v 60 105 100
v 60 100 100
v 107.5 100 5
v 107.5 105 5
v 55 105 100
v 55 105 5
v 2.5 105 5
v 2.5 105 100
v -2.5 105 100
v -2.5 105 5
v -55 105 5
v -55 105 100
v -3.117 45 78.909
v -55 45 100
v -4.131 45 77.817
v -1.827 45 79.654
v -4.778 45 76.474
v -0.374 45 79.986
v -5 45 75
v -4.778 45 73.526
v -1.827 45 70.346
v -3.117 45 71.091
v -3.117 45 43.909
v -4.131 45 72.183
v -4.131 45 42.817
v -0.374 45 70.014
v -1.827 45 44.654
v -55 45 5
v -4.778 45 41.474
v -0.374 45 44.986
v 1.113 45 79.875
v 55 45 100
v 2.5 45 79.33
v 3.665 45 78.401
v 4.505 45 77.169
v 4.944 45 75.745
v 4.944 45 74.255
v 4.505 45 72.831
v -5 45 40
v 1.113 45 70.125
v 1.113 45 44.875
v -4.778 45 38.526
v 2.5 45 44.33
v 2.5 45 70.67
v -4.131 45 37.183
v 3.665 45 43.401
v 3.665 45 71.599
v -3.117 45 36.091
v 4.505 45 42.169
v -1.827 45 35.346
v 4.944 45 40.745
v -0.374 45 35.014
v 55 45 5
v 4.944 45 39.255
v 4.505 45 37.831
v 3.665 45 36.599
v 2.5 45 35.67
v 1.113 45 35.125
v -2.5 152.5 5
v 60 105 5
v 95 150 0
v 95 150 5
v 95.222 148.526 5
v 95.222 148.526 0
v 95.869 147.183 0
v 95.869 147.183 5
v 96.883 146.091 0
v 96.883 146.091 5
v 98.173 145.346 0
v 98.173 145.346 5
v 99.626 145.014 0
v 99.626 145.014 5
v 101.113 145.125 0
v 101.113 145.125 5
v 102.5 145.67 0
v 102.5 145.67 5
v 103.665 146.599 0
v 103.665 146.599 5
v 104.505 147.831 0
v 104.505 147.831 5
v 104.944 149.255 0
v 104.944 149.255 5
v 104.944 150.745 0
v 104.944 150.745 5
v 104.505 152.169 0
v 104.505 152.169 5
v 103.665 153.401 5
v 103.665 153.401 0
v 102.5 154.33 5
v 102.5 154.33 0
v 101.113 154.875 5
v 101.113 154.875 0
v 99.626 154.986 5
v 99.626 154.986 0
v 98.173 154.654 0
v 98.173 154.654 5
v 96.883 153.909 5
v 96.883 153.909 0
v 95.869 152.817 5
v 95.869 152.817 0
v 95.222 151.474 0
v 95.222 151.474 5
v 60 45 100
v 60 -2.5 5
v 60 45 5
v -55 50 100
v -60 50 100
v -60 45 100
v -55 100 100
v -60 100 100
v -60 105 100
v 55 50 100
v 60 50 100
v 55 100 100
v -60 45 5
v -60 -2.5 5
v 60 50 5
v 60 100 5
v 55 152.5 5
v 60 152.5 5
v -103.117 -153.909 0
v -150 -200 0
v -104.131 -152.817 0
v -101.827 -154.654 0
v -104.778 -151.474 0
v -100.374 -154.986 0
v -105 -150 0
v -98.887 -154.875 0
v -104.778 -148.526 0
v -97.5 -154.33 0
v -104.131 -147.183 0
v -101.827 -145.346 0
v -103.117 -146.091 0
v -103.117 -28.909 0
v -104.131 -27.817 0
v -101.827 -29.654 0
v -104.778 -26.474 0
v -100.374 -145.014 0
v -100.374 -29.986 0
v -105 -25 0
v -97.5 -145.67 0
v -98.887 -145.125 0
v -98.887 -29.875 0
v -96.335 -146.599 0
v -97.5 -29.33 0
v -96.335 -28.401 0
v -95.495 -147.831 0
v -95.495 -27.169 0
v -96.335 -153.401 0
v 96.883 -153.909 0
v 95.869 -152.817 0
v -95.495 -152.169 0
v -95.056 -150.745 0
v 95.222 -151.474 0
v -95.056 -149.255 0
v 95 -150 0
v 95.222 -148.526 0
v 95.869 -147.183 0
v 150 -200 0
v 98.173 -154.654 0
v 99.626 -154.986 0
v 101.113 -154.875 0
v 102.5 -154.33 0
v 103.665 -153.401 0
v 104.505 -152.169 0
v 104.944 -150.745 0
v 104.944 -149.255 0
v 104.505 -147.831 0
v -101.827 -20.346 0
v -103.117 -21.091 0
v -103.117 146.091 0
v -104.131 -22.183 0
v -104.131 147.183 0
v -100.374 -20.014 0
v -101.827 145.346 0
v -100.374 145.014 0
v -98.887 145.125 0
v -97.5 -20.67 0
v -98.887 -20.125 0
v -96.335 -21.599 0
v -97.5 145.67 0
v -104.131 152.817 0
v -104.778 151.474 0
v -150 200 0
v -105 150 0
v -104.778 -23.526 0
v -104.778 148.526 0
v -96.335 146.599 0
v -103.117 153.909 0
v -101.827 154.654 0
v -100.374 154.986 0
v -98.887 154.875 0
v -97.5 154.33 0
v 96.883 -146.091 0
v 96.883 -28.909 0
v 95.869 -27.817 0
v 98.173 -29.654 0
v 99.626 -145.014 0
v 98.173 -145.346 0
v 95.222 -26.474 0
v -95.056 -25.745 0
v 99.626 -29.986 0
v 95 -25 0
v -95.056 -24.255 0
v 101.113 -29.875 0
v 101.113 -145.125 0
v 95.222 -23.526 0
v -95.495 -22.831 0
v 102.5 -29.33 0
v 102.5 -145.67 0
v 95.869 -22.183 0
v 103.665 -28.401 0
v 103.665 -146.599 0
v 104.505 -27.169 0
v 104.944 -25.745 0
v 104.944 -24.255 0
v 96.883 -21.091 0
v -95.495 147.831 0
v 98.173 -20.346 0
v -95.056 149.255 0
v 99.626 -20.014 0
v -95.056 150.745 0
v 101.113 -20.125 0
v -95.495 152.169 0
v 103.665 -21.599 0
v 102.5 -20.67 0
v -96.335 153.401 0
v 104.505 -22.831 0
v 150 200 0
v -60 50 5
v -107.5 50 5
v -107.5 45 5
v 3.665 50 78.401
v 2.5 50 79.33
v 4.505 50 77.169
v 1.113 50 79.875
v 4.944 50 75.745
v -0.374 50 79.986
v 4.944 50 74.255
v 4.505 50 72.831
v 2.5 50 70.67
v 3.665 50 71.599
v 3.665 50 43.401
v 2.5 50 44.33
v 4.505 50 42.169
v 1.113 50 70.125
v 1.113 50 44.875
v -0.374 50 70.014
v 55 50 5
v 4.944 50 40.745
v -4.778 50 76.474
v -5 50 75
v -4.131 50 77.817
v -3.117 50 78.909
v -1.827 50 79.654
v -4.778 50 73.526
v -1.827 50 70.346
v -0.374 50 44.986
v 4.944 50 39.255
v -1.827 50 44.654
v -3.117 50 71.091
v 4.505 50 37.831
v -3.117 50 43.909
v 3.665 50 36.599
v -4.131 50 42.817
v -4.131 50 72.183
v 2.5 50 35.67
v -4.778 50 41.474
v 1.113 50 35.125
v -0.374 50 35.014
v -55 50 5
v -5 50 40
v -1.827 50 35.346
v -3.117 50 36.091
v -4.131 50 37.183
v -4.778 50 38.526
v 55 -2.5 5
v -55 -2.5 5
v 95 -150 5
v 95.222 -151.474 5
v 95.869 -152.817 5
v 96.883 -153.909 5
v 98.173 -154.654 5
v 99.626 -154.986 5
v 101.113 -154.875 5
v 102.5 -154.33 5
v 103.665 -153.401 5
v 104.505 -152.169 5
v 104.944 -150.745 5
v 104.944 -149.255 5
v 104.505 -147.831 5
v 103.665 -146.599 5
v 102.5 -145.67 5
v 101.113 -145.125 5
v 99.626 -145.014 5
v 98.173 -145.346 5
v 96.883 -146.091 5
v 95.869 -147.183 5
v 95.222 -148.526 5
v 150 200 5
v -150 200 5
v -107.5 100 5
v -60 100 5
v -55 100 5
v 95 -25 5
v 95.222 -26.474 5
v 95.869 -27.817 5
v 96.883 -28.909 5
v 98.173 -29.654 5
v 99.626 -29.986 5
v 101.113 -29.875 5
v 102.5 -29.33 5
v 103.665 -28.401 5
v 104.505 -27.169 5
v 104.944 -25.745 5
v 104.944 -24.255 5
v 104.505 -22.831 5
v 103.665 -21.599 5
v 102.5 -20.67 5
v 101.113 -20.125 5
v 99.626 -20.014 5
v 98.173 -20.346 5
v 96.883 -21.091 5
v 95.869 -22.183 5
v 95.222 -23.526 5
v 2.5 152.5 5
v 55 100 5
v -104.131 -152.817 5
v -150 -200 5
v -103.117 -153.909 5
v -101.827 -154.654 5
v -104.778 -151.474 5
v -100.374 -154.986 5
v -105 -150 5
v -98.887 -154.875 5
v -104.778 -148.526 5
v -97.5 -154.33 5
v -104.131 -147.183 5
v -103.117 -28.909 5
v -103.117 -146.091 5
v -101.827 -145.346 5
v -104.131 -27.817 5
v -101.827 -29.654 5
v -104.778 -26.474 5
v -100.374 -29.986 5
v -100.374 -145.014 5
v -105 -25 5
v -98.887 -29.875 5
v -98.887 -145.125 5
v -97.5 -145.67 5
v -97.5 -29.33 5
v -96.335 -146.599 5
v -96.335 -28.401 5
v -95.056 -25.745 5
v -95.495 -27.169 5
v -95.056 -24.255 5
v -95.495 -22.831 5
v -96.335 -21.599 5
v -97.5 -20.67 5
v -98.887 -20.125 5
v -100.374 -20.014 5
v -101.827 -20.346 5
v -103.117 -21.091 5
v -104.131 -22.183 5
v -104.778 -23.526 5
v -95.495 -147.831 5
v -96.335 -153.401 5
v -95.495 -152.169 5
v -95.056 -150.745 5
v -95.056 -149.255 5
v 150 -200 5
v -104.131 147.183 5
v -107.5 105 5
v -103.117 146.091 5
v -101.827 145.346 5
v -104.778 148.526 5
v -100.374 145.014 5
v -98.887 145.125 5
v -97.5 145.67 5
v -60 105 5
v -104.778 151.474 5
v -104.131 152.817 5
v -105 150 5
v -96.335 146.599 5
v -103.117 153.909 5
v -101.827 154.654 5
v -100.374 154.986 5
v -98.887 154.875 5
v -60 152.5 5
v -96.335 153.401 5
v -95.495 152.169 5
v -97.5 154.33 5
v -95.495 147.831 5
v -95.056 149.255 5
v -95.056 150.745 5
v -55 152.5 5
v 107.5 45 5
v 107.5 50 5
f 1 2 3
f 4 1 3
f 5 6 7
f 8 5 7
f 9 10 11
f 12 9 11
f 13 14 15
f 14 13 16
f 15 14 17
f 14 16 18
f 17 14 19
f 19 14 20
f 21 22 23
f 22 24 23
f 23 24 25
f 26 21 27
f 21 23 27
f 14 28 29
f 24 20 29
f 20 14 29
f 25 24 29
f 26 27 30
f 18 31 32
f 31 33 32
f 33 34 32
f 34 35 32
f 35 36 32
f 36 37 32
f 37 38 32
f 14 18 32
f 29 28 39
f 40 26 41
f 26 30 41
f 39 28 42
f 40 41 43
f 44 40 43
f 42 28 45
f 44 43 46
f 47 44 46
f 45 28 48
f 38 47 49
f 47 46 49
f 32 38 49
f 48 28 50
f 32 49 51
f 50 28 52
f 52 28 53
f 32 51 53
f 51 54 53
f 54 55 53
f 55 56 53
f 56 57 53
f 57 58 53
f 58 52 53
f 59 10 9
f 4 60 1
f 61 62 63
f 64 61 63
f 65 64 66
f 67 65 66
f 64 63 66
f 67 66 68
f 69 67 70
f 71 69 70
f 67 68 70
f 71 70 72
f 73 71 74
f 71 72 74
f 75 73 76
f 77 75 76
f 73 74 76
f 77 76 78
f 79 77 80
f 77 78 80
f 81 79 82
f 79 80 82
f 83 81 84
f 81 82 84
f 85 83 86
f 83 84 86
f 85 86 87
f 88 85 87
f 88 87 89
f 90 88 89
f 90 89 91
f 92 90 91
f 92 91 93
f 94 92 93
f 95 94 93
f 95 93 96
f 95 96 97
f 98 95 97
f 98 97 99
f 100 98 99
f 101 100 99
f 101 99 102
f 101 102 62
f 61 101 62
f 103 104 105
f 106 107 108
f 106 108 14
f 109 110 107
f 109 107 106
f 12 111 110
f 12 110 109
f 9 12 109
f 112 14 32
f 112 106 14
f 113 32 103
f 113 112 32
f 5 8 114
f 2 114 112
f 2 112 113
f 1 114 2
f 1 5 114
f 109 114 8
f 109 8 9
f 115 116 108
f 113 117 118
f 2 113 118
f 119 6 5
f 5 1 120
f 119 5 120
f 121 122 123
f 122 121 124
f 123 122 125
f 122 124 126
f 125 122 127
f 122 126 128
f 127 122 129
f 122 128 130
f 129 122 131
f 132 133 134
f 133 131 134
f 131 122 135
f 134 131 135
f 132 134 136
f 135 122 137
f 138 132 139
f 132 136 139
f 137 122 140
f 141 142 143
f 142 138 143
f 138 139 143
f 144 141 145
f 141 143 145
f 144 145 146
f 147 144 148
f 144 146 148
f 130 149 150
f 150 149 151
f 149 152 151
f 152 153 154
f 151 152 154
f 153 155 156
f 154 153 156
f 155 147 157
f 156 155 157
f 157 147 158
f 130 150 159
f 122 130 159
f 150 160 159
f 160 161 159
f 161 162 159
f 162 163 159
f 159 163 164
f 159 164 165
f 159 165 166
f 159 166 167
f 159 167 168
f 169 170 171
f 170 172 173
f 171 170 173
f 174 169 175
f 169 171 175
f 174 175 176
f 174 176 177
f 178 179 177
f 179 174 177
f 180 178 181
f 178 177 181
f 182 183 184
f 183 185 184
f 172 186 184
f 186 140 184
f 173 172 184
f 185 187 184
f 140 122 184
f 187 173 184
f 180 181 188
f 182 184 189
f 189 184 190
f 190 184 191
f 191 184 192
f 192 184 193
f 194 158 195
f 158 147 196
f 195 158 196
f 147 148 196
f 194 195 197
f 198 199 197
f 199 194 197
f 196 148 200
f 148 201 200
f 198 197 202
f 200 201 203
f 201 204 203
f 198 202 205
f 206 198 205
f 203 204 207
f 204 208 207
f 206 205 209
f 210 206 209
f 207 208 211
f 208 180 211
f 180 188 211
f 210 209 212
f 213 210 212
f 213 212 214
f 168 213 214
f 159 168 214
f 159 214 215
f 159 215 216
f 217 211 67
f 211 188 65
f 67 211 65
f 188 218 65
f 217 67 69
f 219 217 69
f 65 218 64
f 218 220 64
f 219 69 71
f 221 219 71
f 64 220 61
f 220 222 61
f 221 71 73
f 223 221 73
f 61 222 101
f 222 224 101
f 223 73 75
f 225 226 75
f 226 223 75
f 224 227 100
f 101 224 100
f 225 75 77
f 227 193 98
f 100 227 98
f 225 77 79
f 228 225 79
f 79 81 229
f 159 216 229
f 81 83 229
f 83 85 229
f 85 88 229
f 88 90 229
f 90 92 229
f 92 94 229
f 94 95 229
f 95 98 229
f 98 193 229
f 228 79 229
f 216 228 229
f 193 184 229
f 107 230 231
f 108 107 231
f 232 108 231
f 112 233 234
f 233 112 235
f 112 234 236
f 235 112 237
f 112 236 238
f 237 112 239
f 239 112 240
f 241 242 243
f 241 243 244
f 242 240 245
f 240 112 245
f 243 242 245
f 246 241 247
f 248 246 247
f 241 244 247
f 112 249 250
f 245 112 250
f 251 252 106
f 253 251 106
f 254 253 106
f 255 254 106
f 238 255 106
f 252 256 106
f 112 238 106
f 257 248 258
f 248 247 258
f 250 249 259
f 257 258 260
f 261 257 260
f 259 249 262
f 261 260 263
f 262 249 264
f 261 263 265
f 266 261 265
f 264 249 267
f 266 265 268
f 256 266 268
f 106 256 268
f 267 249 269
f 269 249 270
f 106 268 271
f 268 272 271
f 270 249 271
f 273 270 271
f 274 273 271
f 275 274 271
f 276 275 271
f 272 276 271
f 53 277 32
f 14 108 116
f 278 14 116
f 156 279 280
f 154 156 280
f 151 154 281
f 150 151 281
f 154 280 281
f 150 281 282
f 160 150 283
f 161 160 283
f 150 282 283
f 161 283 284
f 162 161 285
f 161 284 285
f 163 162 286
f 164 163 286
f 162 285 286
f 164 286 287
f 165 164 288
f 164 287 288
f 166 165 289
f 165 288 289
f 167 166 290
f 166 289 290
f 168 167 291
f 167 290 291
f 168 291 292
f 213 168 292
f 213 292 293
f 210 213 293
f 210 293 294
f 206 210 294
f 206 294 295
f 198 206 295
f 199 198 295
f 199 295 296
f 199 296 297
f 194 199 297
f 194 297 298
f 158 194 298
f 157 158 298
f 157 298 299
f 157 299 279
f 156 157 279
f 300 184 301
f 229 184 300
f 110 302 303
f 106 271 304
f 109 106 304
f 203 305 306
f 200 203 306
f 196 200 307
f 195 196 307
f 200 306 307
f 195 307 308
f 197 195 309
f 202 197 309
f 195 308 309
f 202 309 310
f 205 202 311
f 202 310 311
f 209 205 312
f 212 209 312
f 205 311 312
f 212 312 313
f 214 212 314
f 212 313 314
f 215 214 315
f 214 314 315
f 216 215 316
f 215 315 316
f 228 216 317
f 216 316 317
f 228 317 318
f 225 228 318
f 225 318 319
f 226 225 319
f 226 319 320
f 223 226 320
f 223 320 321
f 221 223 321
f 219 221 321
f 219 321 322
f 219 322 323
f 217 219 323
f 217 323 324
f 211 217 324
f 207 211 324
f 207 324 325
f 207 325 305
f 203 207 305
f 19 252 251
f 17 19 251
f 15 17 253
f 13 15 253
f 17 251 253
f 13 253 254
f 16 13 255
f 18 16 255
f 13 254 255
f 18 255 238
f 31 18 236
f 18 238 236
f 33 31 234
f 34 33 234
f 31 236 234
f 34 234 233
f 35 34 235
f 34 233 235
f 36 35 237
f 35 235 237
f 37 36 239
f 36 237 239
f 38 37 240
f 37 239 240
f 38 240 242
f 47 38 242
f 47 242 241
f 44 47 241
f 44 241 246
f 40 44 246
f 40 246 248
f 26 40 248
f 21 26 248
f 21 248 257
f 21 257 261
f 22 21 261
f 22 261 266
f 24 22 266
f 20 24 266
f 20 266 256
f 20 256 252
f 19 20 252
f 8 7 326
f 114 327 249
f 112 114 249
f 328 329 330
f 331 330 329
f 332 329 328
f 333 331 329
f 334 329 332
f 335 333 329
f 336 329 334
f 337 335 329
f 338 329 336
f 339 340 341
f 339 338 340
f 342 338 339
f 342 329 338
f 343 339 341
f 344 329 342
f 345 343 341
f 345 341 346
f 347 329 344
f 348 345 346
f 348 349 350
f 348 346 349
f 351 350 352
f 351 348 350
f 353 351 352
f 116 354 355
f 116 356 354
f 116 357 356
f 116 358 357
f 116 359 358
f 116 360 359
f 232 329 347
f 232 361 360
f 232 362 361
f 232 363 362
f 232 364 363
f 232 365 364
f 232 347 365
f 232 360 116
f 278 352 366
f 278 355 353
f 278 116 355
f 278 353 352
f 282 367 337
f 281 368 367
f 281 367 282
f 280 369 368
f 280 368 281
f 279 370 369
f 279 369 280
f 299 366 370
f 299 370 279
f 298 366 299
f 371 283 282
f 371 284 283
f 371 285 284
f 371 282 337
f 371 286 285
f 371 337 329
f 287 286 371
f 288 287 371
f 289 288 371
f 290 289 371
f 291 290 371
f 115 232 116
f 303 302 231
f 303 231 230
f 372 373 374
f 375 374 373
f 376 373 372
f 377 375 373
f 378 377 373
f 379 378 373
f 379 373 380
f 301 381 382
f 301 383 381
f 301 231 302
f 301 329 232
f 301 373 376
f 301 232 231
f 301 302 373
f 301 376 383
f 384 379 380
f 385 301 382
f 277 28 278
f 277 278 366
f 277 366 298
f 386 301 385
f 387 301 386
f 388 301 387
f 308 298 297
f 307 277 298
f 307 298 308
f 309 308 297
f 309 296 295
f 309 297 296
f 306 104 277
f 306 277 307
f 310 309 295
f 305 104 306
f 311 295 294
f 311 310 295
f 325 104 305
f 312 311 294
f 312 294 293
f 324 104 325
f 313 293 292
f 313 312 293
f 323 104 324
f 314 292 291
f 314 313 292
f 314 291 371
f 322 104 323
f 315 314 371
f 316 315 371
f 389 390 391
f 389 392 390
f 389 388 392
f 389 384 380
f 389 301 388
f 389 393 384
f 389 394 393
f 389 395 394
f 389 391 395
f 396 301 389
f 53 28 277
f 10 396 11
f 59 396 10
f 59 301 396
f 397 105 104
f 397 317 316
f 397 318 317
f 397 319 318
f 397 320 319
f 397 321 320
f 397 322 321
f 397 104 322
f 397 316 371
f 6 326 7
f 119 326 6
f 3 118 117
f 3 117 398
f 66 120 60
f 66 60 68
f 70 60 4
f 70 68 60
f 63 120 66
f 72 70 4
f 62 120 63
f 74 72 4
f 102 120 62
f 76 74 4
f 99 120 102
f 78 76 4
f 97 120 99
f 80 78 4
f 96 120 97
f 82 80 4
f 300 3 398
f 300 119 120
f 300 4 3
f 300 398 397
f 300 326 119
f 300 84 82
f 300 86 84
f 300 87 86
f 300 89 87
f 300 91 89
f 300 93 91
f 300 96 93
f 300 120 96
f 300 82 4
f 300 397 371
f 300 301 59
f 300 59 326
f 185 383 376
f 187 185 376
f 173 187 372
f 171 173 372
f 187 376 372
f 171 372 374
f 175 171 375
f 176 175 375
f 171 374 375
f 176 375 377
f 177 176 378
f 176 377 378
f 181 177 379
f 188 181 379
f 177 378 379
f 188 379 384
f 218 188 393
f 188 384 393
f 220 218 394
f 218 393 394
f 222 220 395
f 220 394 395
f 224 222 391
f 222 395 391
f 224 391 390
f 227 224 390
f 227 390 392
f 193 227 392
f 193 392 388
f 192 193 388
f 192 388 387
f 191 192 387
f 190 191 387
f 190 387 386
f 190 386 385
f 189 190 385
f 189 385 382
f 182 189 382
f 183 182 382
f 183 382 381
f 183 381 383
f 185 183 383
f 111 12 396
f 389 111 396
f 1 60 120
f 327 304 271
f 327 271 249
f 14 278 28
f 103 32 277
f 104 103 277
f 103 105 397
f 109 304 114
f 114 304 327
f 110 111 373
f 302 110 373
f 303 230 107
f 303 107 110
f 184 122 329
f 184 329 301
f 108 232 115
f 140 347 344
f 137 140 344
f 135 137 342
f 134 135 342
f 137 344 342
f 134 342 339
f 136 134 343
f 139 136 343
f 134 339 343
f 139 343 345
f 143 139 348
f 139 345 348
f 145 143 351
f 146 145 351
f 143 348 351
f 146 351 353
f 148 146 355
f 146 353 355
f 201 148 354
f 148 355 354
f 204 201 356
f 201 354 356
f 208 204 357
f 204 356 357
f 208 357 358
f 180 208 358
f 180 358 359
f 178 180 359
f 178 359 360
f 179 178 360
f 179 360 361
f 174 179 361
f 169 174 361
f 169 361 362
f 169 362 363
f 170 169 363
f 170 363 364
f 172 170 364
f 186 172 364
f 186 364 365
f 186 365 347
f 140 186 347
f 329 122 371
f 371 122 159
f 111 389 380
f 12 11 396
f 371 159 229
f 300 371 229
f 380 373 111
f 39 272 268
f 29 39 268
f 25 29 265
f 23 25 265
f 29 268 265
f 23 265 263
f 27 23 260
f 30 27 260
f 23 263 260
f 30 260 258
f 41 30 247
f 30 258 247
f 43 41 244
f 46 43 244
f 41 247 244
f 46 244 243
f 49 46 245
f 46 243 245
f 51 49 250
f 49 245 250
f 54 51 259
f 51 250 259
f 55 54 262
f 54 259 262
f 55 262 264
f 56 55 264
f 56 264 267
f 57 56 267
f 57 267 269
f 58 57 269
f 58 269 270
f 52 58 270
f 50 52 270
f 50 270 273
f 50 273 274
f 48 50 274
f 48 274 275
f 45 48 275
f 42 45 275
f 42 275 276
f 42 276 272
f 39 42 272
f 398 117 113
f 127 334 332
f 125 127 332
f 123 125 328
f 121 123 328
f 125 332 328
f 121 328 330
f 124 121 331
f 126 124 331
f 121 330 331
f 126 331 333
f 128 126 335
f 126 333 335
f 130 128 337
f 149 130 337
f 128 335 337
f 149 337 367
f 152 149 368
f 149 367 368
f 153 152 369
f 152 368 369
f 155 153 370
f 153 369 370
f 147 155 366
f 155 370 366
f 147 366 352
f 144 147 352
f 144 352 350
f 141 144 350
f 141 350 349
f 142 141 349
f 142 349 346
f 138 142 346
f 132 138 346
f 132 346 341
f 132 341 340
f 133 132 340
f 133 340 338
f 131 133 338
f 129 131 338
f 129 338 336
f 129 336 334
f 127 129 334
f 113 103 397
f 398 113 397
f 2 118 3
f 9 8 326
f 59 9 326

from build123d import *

# Parameters (mm, degrees)
F0_W         = 5
F0_H         = 50
F0_H_2       = 5
F0_W_2       = 50
F0_W_3       = 110
F1_DEPTH     = 100
F0_W_4       = 300
F0_H_3       = 400
F2_DEPTH     = 5
F3_T4_DEPTH  = 522.9657747574
F3_T9_DEPTH  = 522.9657747574
F3_T14_DEPTH = 522.9657747574
F3_T19_DEPTH = 522.9657747574
F3_T24_DEPTH = 522.9657747574
F3_T29_DEPTH = 522.9657747574
F3_T34_DEPTH = 522.9657747574
F3_T39_DEPTH = 522.9657747574
F3_T44_DEPTH = 522.9657747574
F6_D         = 10
F6_DEPTH     = 20
F6_TIP       = 3.0043030951
F7_D         = 10
F7_DEPTH     = 20
F7_TIP       = 3.0043030951


# Not quite as in the source:
# - a fillet or chamfer that OpenCascade refuses, or shapes differently, is made with other operations: its cross-section is extruded or revolved along the edge and cut away or added


with BuildPart() as f1:
    # F0 (on Top) → F1 (new body)
    with BuildSketch(Plane.XY):
        with Locations((-57.5, 130)):
            Rectangle(F0_W, F0_H)
        with Locations((-57.5, 20)):
            Rectangle(F0_W, F0_H)
        with Locations((-57.5, 102.5)):
            Rectangle(F0_W, F0_H_2)
        with Locations((57.5, 102.5)):
            Rectangle(F0_W, F0_H_2)
        with Locations((-85, 47.5)):
            Rectangle(F0_W_2, F0_H_2)
        with Locations((-85, 102.5)):
            Rectangle(F0_W_2, F0_H_2)
        Polygon((-55, 105), (-55, 100), (55, 100), (55, 105), (2.5, 105), (-2.5, 105), align=None)
        with Locations((57.5, 47.5)):
            Rectangle(F0_W, F0_H_2)
        with Locations((57.5, 75)):
            Rectangle(F0_W, F0_H)
        with Locations((0, 47.5)):
            Rectangle(F0_W_3, F0_H_2)
        with Locations((57.5, 130)):
            Rectangle(F0_W, F0_H)
        with Locations((85, 102.5)):
            Rectangle(F0_W_2, F0_H_2)
        with Locations((-57.5, 47.5)):
            Rectangle(F0_W, F0_H_2)
        with Locations((85, 47.5)):
            Rectangle(F0_W_2, F0_H_2)
        with Locations((-57.5, 75)):
            Rectangle(F0_W, F0_H)
        with Locations((57.5, 20)):
            Rectangle(F0_W, F0_H)
        with Locations((0, 130)):
            Rectangle(F0_W, F0_H)
    extrude(amount=F1_DEPTH)

    # F0 (on Top) → F2 (join)
    with BuildSketch(Plane.XY):
        Rectangle(F0_W_4, F0_H_3)
        Polygon((55, 45), (-55, 45), (-55, -5), (-60, -5), (-60, 45), (-110, 45), (-110, 50), (-60, 50), (-60, 100), (-110, 100), (-110, 105), (-60, 105), (-60, 155), (-55, 155), (-55, 105), (-2.5, 105), (-2.5, 155), (2.5, 155), (2.5, 105), (55, 105), (55, 155), (60, 155), (60, 105), (110, 105), (110, 100), (60, 100), (60, 50), (110, 50), (110, 45), (60, 45), (60, -5), (55, -5), align=None, mode=Mode.SUBTRACT)
        with Locations((0, 75)):
            Rectangle(F0_W_3, F0_H)
    extrude(amount=F2_DEPTH)

    # F3: chamfer of 50 x 100 on 9 edges, made by hand


with BuildPart() as f3_tool2:
    # F3_s3 → F3_t4 (new body)
    with BuildSketch(Plane.XZ.offset(213.9828873787)):
        Polygon((60, 100), (110, 0), (110, 100), align=None)
    extrude(amount=-F3_T4_DEPTH)

    split(bisect_by=Plane.XY.offset(5), keep=Keep.TOP)


with BuildPart() as f1_1:
    add(f1.part)

    # F3_t1: cut F3_tool2
    add(f3_tool2.part, mode=Mode.SUBTRACT)


with BuildPart() as f3_tool7:
    # F3_s8 → F3_t9 (new body)
    with BuildSketch(Plane.XZ.offset(158.9828873787)):
        Polygon((60, 100), (110, 0), (110, 100), align=None)
    extrude(amount=-F3_T9_DEPTH)

    split(bisect_by=Plane.XY.offset(5), keep=Keep.TOP)


with BuildPart() as f1_2:
    add(f1_1.part)

    # F3_t6: cut F3_tool7
    add(f3_tool7.part, mode=Mode.SUBTRACT)


with BuildPart() as f3_tool12:
    # F3_s13 → F3_t14 (new body)
    with BuildSketch(Plane.YZ.offset(-203.9828873787)):
        Polygon((45, 100), (-5, 0), (-5, 100), align=None)
    extrude(amount=F3_T14_DEPTH)

    split(bisect_by=Plane.XY.offset(5), keep=Keep.TOP)


with BuildPart() as f1_3:
    add(f1_2.part)

    # F3_t11: cut F3_tool12
    add(f3_tool12.part, mode=Mode.SUBTRACT)


with BuildPart() as f3_tool17:
    # F3_s18 → F3_t19 (new body)
    with BuildSketch(Plane.YZ.offset(318.9828873787)):
        Polygon((105, 100), (155, 0), (155, 100), align=None)
    extrude(amount=-F3_T19_DEPTH)

    split(bisect_by=Plane.XY.offset(5), keep=Keep.TOP)


with BuildPart() as f1_4:
    add(f1_3.part)

    # F3_t16: cut F3_tool17
    add(f3_tool17.part, mode=Mode.SUBTRACT)


with BuildPart() as f3_tool22:
    # F3_s23 → F3_t24 (new body)
    with BuildSketch(Plane.YZ.offset(-318.9828873787)):
        Polygon((45, 100), (-5, 0), (-5, 100), align=None)
    extrude(amount=F3_T24_DEPTH)

    split(bisect_by=Plane.XY.offset(5), keep=Keep.TOP)


with BuildPart() as f1_5:
    add(f1_4.part)

    # F3_t21: cut F3_tool22
    add(f3_tool22.part, mode=Mode.SUBTRACT)


with BuildPart() as f3_tool27:
    # F3_s28 → F3_t29 (new body)
    with BuildSketch(Plane.XZ.offset(-308.9828873787)):
        Polygon((-60, 100), (-110, 0), (-110, 100), align=None)
    extrude(amount=F3_T29_DEPTH)

    split(bisect_by=Plane.XY.offset(5), keep=Keep.TOP)


with BuildPart() as f1_6:
    add(f1_5.part)

    # F3_t26: cut F3_tool27
    add(f3_tool27.part, mode=Mode.SUBTRACT)


with BuildPart() as f3_tool32:
    # F3_s33 → F3_t34 (new body)
    with BuildSketch(Plane.XZ.offset(-363.9828873787)):
        Polygon((-60, 100), (-110, 0), (-110, 100), align=None)
    extrude(amount=F3_T34_DEPTH)

    split(bisect_by=Plane.XY.offset(5), keep=Keep.TOP)


with BuildPart() as f1_7:
    add(f1_6.part)

    # F3_t31: cut F3_tool32
    add(f3_tool32.part, mode=Mode.SUBTRACT)


with BuildPart() as f3_tool37:
    # F3_s38 → F3_t39 (new body)
    with BuildSketch(Plane.YZ.offset(203.9828873787)):
        Polygon((155, 0), (105, 100), (155, 100), align=None)
    extrude(amount=-F3_T39_DEPTH)

    split(bisect_by=Plane.XY.offset(5), keep=Keep.TOP)


with BuildPart() as f1_8:
    add(f1_7.part)

    # F3_t36: cut F3_tool37
    add(f3_tool37.part, mode=Mode.SUBTRACT)


with BuildPart() as f3_tool42:
    # F3_s43 → F3_t44 (new body)
    with BuildSketch(Plane.YZ.offset(261.4828873787)):
        Polygon((105, 100), (155, 0), (155, 100), align=None)
    extrude(amount=-F3_T44_DEPTH)

    split(bisect_by=Plane.XY.offset(5), keep=Keep.TOP)


with BuildPart() as f1_9:
    add(f1_8.part)

    # F3_t41: cut F3_tool42
    add(f3_tool42.part, mode=Mode.SUBTRACT)

    # F6
    with Locations(Plane.XZ.offset(-44.9998)):
        with Locations((0, 40), (0, 75)):
            Hole(F6_D / 2, depth=F6_DEPTH)
            with Locations((0, 0, -(F6_DEPTH + F6_TIP / 2))):  # 118° drill point
                Cone(0, F6_D / 2, F6_TIP, mode=Mode.SUBTRACT)

    # F7
    with Locations(Plane(origin=(0, 0, 0), x_dir=(1, 0, 0), z_dir=(0, 0, -1))):
        with Locations((-100, 25), (-100, -150), (100, -150), (100, 25), (100, 150), (-100, 150)):
            Hole(F7_D / 2, depth=F7_DEPTH)
            with Locations((0, 0, -(F7_DEPTH + F7_TIP / 2))):  # 118° drill point
                Cone(0, F7_D / 2, F7_TIP, mode=Mode.SUBTRACT)


solid = f1_9.part
